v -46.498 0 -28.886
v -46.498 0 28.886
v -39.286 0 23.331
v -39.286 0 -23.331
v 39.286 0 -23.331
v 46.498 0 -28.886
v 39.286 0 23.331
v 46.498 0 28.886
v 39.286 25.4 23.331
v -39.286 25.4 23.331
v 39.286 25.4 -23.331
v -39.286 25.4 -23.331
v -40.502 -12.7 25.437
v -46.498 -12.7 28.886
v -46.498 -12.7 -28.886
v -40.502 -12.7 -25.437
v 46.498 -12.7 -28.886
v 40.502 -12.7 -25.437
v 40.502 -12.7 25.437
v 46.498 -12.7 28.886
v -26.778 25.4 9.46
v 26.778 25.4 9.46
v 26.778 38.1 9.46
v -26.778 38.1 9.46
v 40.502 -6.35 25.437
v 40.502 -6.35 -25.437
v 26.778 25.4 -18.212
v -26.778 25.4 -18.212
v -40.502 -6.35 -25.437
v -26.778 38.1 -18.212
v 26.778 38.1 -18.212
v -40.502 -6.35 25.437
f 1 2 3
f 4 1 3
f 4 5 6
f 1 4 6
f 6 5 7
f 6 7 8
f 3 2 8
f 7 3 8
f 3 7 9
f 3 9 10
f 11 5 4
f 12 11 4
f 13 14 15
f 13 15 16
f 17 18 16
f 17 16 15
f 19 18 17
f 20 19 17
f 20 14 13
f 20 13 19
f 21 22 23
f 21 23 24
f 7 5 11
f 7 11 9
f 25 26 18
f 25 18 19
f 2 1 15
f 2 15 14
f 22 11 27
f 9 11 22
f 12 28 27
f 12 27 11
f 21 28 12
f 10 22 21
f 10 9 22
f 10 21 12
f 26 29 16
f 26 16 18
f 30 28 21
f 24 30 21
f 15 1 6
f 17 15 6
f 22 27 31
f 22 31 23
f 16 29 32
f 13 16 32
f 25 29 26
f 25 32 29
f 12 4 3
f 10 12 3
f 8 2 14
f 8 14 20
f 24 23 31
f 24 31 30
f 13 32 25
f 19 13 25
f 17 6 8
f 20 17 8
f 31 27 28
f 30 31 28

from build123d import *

# Parameters (mm, degrees)
F0_W     = 81.626944
F0_H     = 51.38012
F1_DEPTH = 6.35
F2_W     = 92.995196
F2_H     = 57.772774
F2_W_2   = 81.00345
F2_H_2   = 50.874696
F3_DEPTH = 12.7
F4_W     = 78.571246
F4_H     = 46.661102
F5_DEPTH = 25.4
F6_W     = 53.555076
F6_H     = 27.672314
F7_DEPTH = 12.7


with BuildPart() as f1:
    # F0 (on Front) → F1 (new body)
    with BuildSketch(Plane.XZ):
        Rectangle(F0_W, F0_H)
    extrude(amount=F1_DEPTH)

    # F2 (on Front) → F3 (join)
    with BuildSketch(Plane.XZ):
        Rectangle(F2_W, F2_H)
        Rectangle(F2_W_2, F2_H_2, mode=Mode.SUBTRACT)
    extrude(amount=F3_DEPTH)

    # F4 (on face) → F5 (join)
    with BuildSketch(Plane(origin=(0, 0, 0), x_dir=(-1, 0, 0), z_dir=(0, 1, 0))):
        Rectangle(F4_W, F4_H)
    extrude(amount=F5_DEPTH)

    # F6 (on face) → F7 (join)
    with BuildSketch(Plane(origin=(0, 25.4, 0), x_dir=(-1, 0, 0), z_dir=(0, 1, 0))):
        with Locations((0, -4.375952)):
            Rectangle(F6_W, F6_H)
    extrude(amount=F7_DEPTH)


solid = f1.part
